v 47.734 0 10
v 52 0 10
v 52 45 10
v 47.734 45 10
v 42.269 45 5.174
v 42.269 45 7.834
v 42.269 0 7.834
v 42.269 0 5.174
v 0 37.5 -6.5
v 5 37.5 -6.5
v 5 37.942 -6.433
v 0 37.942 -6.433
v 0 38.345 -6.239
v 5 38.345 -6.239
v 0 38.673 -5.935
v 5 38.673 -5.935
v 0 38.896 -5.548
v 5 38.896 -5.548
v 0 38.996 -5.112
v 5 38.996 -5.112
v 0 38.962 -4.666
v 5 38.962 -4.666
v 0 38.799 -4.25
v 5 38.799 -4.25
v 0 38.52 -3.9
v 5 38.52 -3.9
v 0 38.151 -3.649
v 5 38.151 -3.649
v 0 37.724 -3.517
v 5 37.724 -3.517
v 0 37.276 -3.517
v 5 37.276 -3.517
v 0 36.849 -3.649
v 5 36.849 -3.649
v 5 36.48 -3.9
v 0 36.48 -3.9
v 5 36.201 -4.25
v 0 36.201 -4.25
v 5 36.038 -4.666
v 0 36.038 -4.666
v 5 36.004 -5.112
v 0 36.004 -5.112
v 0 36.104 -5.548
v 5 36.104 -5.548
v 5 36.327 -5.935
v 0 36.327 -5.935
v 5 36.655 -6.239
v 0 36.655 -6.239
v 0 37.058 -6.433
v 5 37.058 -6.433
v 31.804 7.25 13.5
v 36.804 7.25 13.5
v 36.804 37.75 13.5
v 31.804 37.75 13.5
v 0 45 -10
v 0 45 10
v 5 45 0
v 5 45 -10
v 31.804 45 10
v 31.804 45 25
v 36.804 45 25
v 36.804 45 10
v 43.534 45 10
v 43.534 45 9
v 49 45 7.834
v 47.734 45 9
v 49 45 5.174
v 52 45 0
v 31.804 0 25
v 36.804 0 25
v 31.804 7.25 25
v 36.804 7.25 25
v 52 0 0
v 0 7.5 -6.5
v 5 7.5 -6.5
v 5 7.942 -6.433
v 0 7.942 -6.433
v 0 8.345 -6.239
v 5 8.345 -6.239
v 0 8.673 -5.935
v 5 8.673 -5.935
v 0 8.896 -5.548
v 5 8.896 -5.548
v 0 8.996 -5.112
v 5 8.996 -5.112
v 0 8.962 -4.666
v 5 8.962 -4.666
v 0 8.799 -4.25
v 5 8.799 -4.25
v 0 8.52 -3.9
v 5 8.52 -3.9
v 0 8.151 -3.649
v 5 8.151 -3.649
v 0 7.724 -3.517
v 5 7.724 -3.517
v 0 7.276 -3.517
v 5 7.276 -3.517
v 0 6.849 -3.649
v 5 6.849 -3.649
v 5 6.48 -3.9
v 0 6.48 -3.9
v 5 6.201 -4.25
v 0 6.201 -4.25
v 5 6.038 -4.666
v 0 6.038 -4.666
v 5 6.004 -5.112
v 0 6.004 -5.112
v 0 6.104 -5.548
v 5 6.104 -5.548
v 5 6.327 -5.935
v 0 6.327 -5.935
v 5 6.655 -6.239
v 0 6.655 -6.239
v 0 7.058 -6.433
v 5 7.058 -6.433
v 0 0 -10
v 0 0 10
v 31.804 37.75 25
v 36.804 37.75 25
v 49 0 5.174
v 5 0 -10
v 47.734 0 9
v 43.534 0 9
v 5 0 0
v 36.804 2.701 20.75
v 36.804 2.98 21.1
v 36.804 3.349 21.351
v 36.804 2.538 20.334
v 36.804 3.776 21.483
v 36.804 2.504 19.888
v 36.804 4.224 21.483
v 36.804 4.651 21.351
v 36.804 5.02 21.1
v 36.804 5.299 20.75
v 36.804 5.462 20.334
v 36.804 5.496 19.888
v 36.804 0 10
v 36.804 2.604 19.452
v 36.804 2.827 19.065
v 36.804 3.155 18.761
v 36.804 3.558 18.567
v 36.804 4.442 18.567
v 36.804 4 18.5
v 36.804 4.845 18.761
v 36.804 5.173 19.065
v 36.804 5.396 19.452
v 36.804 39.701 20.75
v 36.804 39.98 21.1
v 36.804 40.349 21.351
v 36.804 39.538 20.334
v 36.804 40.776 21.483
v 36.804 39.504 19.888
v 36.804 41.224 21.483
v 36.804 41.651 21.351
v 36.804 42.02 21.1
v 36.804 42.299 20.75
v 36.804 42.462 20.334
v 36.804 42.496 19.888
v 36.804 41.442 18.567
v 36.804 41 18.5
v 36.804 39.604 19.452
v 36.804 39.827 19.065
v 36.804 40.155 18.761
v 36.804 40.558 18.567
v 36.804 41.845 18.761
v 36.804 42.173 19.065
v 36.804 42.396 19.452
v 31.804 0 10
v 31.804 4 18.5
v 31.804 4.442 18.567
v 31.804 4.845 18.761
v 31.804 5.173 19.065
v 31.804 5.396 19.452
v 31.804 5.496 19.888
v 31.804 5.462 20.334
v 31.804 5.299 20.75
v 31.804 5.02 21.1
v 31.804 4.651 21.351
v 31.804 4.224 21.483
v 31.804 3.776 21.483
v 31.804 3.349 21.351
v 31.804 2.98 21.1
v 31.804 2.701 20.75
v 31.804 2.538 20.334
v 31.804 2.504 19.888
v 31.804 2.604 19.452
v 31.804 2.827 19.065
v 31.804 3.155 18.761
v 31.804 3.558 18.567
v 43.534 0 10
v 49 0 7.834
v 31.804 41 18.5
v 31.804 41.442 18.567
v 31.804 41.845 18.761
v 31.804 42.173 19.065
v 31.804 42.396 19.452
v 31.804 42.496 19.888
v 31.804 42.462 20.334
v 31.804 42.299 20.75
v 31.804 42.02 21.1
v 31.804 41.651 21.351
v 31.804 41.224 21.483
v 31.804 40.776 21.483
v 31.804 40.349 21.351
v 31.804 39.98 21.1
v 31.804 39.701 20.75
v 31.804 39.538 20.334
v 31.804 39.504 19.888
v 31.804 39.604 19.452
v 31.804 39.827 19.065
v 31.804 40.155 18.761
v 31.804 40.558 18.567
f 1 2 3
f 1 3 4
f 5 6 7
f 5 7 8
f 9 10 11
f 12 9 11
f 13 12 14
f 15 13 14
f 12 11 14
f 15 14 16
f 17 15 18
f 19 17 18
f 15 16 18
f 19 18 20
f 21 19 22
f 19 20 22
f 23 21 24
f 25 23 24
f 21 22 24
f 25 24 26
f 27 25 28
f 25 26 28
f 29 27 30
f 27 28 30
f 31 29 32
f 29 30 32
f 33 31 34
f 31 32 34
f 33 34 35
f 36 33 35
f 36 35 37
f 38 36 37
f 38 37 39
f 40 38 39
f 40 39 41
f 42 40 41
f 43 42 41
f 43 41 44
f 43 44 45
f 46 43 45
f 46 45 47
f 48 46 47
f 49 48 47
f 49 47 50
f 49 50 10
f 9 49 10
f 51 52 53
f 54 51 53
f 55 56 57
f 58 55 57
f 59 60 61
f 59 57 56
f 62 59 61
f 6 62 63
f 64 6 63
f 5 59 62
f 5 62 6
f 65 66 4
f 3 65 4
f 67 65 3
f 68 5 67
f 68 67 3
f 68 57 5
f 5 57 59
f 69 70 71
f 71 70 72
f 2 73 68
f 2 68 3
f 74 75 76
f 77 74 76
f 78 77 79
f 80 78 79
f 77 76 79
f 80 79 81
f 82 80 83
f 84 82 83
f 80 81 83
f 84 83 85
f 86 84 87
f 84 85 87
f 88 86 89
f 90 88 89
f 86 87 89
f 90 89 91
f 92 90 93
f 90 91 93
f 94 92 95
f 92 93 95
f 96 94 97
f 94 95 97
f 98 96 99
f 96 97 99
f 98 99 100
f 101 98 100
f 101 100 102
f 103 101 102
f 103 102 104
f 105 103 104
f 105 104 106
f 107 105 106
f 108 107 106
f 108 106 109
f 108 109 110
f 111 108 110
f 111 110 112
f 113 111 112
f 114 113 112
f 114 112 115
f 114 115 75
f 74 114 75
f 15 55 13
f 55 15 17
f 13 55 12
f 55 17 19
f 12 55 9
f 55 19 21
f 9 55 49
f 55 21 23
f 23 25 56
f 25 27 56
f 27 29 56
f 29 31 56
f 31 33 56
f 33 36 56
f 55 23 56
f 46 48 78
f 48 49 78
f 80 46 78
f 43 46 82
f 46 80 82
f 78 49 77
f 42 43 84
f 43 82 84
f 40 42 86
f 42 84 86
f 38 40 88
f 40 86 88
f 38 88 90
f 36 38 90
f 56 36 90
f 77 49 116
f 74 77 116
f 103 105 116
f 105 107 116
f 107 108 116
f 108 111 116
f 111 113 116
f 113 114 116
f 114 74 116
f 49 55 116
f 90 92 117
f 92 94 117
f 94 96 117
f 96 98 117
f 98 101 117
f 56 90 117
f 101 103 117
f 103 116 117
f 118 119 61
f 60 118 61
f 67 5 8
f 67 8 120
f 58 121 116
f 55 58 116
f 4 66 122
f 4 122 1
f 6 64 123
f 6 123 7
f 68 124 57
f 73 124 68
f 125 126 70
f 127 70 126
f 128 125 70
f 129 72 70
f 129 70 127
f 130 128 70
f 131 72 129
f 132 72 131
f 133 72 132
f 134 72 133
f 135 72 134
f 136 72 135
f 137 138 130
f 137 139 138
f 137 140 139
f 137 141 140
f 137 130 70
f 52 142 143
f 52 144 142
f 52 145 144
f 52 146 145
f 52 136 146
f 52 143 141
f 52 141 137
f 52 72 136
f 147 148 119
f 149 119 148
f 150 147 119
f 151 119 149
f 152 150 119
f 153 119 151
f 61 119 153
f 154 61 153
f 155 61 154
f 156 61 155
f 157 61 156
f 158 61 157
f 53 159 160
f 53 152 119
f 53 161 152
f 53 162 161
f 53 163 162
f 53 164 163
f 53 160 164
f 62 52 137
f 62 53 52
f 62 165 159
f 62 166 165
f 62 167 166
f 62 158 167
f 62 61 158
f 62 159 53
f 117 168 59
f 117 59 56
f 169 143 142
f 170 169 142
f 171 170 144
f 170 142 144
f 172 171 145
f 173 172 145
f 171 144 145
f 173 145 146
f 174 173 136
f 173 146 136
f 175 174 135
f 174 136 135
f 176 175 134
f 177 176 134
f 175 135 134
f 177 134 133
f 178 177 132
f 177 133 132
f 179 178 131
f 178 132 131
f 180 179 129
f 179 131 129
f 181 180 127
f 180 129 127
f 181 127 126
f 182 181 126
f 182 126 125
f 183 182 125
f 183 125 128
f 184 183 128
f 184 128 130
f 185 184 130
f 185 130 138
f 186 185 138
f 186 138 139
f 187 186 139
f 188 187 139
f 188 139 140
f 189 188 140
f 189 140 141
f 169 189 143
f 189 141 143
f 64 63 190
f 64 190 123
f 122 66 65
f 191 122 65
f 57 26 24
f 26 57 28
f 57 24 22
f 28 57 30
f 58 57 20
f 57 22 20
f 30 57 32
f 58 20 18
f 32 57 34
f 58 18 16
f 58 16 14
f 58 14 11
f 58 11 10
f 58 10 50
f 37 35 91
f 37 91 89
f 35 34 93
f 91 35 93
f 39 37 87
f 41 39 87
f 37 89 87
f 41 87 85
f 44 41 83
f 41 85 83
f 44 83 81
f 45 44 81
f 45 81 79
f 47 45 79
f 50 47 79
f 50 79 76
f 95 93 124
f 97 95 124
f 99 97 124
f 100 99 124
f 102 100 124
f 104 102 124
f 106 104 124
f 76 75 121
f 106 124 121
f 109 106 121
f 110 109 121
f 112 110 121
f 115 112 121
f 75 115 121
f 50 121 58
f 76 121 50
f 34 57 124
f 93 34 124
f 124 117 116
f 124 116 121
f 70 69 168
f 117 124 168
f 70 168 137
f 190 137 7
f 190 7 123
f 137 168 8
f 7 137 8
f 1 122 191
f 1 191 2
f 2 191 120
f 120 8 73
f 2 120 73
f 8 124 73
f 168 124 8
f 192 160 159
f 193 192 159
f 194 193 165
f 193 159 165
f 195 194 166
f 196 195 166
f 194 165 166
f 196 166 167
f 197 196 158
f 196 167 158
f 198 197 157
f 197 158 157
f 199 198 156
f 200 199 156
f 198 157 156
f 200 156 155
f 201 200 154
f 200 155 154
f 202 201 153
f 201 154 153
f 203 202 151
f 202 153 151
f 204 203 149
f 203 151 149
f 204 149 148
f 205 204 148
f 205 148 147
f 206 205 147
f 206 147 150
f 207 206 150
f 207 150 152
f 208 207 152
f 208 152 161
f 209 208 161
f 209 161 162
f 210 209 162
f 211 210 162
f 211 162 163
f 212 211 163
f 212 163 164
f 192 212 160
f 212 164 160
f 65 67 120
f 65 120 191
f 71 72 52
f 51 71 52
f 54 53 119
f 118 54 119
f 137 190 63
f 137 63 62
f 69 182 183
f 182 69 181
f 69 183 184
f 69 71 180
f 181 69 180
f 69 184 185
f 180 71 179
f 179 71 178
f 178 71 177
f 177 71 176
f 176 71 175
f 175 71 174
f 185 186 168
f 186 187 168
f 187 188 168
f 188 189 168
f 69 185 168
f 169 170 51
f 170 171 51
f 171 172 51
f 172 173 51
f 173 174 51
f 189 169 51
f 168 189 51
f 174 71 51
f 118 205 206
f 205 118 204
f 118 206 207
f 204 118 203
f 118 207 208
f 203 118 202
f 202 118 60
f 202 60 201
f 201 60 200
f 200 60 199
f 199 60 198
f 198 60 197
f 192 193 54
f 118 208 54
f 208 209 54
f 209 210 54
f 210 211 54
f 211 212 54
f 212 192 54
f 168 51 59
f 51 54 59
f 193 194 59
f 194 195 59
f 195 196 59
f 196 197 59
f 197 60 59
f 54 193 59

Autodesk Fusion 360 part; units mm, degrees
sketch "Sketch1" plane through (0, 0, 0) normal (0, 1, 0) x (1, 0, 0)
  line L0 (0, 0) -> (52, 0)
  line L1 (52, 0) -> (52, -10)
  line L2 (52, -10) -> (0, -10)
  line L3 (0, -10) -> (0, 0)
  line L4 (0, 0) -> (5, 0)
  line L5 (5, 0) -> (5, 10)
  line L6 (5, 10) -> (0, 10)
  line L7 (0, 10) -> (0, 0)
  dimension "d1" = 52
  dimension "d2" = 10
  dimension "d3" = 5
  dimension "d4" = 10
extrude "Extrude1" add sketch "Sketch1" along normal blind 45
sketch "Sketch2" plane through (0, 45, 0) normal (0, 1, 0) x (-1, 0, 0)
  line L0 (-5, 0) -> (-5, -10)
  line L1 (-5, -10) -> (0, -10)
  line L2 (0, -10) -> (0, 10)
  line L3 (0, 10) -> (-52, 10)
  line L4 (-52, 10) -> (-52, 0)
  line L5 (-52, 0) -> (-5, 0)
  line L6 (-49, 7.834) -> (-42.269, 7.834)
  line L7 (-42.269, 7.834) -> (-42.269, 5.174)
  line L8 (-42.269, 5.174) -> (-49, 5.174)
  line L9 (-49, 5.174) -> (-49, 7.834)
  line L10 (-49, 7.834) -> (-42.269, 5.174) construction
  line L11 (-42.269, 7.834) -> (-49, 5.174) construction
  line L12 (-47.7345, 10) -> (-43.5345, 10)
  line L13 (-43.5345, 10) -> (-43.5345, 9)
  line L14 (-43.5345, 9) -> (-47.7345, 9)
  line L15 (-47.7345, 9) -> (-47.7345, 10)
  line L16 (-47.7345, 10) -> (-43.5345, 9) construction
  line L17 (-43.5345, 10) -> (-47.7345, 9) construction
  line L18 (-47.7345, 9) -> (-49, 7.834)
  line L19 (-43.5345, 9) -> (-42.269, 7.834)
  line L20 (-45.6345, 6.504) -> (-45.6345, 9.5)
  point P0 (-45.6345, 6.504)
  point P1 (-45.6345, 9.5)
  dimension "rail_upper_part_depth" = 1
  dimension "rail_upper_part_width" = 4.2
  dimension "rail_depth" = 4.826
  dimension "rail_base_depth" = 2.66
  dimension "rail_edge_position" = 3
  dimension "rail_base_width" = 6.731
extrude "Extrude2" cut sketch "Sketch2" against normal up to surface (45 mm away) contours L3 L12 L13 L14 L15 | L6 L14 L18 L20 | L6 L14 L19 L20 | L6 L7 L8 L9
ref_plane "WorkPlane1" through (36.8045, 22.5, 9.5) normal (1, 0, 0) x (0, 0, 1)
sketch "Sketch3" plane through (36.8045, 22.5, 9.5) normal (1, 0, 0) x (0, 0, -1)
  line L0 (-0.5, -22.5) -> (-15.5, -22.5)
  line L1 (-15.5, -22.5) -> (-15.5, 22.5)
  line L2 (-15.5, 22.5) -> (-0.5, 22.5)
  line L3 (-0.5, 22.5) -> (-0.5, -22.5)
  line L4 (-0.5, 22.5) -> (9.5, 22.5)
  line L5 (9.5, -22.5) -> (-0.5, -22.5)
  line L6 (-0.5, -22.5) -> (-0.5, 22.5)
  line L7 (-15.5, -15.25) -> (-4, -15.25)
  line L8 (-4, -15.25) -> (-4, 15.25)
  line L9 (-4, 15.25) -> (-15.5, 15.25)
  line L10 (-15.5, 15.25) -> (-15.5, -15.25)
  line L11 (-15.5, -15.25) -> (-4, 15.25) construction
  line L12 (-4, -15.25) -> (-15.5, 15.25) construction
  circle A0 centre (-10.5, -18.5) radius 1.5
  line L13 (-15.5, 0) -> (-4, 0)
  circle A1 centre (-10.5, 18.5) radius 1.5
  point P0 (-9.75, 0)
  dimension "moto_holder_frae_length" = 15
  dimension "motor_width_space" = 30.5
  dimension "d22" = 22.5
  dimension "d23" = 37
  dimension "d25" = 3
  dimension "holes_from_surface2" = 10
  dimension "d27" = 3.5
extrude "Extrude3" add sketch "Sketch3" against normal blind 5 contours L0 L1 L2 L3 L6 L7 L8 L9
sketch "Sketch4" plane through (5, 0, 0) normal (1, 0, 0) x (0, 0, -1)
  line L0 (0, 0) -> (10, 0)
  line L1 (10, 0) -> (10, 45)
  line L2 (10, 45) -> (0, 45)
  line L3 (0, 45) -> (0, 0)
  line L4 (10, 22.5) -> (0, 22.5)
  circle A0 centre (5, 37.5) radius 1.5
  circle A1 centre (5, 7.5) radius 1.5
  dimension "d30" = 3
  dimension "d31" = 5
  dimension "d32" = 30
extrude "Extrude4" cut sketch "Sketch4" against normal up to surface (5 mm away) contours A0 | A1
equation "d5 = 45 mm"
equation "motor_holder_from_rail_edge = -6.73 mm"
equation "d22 = d5 / 2"
